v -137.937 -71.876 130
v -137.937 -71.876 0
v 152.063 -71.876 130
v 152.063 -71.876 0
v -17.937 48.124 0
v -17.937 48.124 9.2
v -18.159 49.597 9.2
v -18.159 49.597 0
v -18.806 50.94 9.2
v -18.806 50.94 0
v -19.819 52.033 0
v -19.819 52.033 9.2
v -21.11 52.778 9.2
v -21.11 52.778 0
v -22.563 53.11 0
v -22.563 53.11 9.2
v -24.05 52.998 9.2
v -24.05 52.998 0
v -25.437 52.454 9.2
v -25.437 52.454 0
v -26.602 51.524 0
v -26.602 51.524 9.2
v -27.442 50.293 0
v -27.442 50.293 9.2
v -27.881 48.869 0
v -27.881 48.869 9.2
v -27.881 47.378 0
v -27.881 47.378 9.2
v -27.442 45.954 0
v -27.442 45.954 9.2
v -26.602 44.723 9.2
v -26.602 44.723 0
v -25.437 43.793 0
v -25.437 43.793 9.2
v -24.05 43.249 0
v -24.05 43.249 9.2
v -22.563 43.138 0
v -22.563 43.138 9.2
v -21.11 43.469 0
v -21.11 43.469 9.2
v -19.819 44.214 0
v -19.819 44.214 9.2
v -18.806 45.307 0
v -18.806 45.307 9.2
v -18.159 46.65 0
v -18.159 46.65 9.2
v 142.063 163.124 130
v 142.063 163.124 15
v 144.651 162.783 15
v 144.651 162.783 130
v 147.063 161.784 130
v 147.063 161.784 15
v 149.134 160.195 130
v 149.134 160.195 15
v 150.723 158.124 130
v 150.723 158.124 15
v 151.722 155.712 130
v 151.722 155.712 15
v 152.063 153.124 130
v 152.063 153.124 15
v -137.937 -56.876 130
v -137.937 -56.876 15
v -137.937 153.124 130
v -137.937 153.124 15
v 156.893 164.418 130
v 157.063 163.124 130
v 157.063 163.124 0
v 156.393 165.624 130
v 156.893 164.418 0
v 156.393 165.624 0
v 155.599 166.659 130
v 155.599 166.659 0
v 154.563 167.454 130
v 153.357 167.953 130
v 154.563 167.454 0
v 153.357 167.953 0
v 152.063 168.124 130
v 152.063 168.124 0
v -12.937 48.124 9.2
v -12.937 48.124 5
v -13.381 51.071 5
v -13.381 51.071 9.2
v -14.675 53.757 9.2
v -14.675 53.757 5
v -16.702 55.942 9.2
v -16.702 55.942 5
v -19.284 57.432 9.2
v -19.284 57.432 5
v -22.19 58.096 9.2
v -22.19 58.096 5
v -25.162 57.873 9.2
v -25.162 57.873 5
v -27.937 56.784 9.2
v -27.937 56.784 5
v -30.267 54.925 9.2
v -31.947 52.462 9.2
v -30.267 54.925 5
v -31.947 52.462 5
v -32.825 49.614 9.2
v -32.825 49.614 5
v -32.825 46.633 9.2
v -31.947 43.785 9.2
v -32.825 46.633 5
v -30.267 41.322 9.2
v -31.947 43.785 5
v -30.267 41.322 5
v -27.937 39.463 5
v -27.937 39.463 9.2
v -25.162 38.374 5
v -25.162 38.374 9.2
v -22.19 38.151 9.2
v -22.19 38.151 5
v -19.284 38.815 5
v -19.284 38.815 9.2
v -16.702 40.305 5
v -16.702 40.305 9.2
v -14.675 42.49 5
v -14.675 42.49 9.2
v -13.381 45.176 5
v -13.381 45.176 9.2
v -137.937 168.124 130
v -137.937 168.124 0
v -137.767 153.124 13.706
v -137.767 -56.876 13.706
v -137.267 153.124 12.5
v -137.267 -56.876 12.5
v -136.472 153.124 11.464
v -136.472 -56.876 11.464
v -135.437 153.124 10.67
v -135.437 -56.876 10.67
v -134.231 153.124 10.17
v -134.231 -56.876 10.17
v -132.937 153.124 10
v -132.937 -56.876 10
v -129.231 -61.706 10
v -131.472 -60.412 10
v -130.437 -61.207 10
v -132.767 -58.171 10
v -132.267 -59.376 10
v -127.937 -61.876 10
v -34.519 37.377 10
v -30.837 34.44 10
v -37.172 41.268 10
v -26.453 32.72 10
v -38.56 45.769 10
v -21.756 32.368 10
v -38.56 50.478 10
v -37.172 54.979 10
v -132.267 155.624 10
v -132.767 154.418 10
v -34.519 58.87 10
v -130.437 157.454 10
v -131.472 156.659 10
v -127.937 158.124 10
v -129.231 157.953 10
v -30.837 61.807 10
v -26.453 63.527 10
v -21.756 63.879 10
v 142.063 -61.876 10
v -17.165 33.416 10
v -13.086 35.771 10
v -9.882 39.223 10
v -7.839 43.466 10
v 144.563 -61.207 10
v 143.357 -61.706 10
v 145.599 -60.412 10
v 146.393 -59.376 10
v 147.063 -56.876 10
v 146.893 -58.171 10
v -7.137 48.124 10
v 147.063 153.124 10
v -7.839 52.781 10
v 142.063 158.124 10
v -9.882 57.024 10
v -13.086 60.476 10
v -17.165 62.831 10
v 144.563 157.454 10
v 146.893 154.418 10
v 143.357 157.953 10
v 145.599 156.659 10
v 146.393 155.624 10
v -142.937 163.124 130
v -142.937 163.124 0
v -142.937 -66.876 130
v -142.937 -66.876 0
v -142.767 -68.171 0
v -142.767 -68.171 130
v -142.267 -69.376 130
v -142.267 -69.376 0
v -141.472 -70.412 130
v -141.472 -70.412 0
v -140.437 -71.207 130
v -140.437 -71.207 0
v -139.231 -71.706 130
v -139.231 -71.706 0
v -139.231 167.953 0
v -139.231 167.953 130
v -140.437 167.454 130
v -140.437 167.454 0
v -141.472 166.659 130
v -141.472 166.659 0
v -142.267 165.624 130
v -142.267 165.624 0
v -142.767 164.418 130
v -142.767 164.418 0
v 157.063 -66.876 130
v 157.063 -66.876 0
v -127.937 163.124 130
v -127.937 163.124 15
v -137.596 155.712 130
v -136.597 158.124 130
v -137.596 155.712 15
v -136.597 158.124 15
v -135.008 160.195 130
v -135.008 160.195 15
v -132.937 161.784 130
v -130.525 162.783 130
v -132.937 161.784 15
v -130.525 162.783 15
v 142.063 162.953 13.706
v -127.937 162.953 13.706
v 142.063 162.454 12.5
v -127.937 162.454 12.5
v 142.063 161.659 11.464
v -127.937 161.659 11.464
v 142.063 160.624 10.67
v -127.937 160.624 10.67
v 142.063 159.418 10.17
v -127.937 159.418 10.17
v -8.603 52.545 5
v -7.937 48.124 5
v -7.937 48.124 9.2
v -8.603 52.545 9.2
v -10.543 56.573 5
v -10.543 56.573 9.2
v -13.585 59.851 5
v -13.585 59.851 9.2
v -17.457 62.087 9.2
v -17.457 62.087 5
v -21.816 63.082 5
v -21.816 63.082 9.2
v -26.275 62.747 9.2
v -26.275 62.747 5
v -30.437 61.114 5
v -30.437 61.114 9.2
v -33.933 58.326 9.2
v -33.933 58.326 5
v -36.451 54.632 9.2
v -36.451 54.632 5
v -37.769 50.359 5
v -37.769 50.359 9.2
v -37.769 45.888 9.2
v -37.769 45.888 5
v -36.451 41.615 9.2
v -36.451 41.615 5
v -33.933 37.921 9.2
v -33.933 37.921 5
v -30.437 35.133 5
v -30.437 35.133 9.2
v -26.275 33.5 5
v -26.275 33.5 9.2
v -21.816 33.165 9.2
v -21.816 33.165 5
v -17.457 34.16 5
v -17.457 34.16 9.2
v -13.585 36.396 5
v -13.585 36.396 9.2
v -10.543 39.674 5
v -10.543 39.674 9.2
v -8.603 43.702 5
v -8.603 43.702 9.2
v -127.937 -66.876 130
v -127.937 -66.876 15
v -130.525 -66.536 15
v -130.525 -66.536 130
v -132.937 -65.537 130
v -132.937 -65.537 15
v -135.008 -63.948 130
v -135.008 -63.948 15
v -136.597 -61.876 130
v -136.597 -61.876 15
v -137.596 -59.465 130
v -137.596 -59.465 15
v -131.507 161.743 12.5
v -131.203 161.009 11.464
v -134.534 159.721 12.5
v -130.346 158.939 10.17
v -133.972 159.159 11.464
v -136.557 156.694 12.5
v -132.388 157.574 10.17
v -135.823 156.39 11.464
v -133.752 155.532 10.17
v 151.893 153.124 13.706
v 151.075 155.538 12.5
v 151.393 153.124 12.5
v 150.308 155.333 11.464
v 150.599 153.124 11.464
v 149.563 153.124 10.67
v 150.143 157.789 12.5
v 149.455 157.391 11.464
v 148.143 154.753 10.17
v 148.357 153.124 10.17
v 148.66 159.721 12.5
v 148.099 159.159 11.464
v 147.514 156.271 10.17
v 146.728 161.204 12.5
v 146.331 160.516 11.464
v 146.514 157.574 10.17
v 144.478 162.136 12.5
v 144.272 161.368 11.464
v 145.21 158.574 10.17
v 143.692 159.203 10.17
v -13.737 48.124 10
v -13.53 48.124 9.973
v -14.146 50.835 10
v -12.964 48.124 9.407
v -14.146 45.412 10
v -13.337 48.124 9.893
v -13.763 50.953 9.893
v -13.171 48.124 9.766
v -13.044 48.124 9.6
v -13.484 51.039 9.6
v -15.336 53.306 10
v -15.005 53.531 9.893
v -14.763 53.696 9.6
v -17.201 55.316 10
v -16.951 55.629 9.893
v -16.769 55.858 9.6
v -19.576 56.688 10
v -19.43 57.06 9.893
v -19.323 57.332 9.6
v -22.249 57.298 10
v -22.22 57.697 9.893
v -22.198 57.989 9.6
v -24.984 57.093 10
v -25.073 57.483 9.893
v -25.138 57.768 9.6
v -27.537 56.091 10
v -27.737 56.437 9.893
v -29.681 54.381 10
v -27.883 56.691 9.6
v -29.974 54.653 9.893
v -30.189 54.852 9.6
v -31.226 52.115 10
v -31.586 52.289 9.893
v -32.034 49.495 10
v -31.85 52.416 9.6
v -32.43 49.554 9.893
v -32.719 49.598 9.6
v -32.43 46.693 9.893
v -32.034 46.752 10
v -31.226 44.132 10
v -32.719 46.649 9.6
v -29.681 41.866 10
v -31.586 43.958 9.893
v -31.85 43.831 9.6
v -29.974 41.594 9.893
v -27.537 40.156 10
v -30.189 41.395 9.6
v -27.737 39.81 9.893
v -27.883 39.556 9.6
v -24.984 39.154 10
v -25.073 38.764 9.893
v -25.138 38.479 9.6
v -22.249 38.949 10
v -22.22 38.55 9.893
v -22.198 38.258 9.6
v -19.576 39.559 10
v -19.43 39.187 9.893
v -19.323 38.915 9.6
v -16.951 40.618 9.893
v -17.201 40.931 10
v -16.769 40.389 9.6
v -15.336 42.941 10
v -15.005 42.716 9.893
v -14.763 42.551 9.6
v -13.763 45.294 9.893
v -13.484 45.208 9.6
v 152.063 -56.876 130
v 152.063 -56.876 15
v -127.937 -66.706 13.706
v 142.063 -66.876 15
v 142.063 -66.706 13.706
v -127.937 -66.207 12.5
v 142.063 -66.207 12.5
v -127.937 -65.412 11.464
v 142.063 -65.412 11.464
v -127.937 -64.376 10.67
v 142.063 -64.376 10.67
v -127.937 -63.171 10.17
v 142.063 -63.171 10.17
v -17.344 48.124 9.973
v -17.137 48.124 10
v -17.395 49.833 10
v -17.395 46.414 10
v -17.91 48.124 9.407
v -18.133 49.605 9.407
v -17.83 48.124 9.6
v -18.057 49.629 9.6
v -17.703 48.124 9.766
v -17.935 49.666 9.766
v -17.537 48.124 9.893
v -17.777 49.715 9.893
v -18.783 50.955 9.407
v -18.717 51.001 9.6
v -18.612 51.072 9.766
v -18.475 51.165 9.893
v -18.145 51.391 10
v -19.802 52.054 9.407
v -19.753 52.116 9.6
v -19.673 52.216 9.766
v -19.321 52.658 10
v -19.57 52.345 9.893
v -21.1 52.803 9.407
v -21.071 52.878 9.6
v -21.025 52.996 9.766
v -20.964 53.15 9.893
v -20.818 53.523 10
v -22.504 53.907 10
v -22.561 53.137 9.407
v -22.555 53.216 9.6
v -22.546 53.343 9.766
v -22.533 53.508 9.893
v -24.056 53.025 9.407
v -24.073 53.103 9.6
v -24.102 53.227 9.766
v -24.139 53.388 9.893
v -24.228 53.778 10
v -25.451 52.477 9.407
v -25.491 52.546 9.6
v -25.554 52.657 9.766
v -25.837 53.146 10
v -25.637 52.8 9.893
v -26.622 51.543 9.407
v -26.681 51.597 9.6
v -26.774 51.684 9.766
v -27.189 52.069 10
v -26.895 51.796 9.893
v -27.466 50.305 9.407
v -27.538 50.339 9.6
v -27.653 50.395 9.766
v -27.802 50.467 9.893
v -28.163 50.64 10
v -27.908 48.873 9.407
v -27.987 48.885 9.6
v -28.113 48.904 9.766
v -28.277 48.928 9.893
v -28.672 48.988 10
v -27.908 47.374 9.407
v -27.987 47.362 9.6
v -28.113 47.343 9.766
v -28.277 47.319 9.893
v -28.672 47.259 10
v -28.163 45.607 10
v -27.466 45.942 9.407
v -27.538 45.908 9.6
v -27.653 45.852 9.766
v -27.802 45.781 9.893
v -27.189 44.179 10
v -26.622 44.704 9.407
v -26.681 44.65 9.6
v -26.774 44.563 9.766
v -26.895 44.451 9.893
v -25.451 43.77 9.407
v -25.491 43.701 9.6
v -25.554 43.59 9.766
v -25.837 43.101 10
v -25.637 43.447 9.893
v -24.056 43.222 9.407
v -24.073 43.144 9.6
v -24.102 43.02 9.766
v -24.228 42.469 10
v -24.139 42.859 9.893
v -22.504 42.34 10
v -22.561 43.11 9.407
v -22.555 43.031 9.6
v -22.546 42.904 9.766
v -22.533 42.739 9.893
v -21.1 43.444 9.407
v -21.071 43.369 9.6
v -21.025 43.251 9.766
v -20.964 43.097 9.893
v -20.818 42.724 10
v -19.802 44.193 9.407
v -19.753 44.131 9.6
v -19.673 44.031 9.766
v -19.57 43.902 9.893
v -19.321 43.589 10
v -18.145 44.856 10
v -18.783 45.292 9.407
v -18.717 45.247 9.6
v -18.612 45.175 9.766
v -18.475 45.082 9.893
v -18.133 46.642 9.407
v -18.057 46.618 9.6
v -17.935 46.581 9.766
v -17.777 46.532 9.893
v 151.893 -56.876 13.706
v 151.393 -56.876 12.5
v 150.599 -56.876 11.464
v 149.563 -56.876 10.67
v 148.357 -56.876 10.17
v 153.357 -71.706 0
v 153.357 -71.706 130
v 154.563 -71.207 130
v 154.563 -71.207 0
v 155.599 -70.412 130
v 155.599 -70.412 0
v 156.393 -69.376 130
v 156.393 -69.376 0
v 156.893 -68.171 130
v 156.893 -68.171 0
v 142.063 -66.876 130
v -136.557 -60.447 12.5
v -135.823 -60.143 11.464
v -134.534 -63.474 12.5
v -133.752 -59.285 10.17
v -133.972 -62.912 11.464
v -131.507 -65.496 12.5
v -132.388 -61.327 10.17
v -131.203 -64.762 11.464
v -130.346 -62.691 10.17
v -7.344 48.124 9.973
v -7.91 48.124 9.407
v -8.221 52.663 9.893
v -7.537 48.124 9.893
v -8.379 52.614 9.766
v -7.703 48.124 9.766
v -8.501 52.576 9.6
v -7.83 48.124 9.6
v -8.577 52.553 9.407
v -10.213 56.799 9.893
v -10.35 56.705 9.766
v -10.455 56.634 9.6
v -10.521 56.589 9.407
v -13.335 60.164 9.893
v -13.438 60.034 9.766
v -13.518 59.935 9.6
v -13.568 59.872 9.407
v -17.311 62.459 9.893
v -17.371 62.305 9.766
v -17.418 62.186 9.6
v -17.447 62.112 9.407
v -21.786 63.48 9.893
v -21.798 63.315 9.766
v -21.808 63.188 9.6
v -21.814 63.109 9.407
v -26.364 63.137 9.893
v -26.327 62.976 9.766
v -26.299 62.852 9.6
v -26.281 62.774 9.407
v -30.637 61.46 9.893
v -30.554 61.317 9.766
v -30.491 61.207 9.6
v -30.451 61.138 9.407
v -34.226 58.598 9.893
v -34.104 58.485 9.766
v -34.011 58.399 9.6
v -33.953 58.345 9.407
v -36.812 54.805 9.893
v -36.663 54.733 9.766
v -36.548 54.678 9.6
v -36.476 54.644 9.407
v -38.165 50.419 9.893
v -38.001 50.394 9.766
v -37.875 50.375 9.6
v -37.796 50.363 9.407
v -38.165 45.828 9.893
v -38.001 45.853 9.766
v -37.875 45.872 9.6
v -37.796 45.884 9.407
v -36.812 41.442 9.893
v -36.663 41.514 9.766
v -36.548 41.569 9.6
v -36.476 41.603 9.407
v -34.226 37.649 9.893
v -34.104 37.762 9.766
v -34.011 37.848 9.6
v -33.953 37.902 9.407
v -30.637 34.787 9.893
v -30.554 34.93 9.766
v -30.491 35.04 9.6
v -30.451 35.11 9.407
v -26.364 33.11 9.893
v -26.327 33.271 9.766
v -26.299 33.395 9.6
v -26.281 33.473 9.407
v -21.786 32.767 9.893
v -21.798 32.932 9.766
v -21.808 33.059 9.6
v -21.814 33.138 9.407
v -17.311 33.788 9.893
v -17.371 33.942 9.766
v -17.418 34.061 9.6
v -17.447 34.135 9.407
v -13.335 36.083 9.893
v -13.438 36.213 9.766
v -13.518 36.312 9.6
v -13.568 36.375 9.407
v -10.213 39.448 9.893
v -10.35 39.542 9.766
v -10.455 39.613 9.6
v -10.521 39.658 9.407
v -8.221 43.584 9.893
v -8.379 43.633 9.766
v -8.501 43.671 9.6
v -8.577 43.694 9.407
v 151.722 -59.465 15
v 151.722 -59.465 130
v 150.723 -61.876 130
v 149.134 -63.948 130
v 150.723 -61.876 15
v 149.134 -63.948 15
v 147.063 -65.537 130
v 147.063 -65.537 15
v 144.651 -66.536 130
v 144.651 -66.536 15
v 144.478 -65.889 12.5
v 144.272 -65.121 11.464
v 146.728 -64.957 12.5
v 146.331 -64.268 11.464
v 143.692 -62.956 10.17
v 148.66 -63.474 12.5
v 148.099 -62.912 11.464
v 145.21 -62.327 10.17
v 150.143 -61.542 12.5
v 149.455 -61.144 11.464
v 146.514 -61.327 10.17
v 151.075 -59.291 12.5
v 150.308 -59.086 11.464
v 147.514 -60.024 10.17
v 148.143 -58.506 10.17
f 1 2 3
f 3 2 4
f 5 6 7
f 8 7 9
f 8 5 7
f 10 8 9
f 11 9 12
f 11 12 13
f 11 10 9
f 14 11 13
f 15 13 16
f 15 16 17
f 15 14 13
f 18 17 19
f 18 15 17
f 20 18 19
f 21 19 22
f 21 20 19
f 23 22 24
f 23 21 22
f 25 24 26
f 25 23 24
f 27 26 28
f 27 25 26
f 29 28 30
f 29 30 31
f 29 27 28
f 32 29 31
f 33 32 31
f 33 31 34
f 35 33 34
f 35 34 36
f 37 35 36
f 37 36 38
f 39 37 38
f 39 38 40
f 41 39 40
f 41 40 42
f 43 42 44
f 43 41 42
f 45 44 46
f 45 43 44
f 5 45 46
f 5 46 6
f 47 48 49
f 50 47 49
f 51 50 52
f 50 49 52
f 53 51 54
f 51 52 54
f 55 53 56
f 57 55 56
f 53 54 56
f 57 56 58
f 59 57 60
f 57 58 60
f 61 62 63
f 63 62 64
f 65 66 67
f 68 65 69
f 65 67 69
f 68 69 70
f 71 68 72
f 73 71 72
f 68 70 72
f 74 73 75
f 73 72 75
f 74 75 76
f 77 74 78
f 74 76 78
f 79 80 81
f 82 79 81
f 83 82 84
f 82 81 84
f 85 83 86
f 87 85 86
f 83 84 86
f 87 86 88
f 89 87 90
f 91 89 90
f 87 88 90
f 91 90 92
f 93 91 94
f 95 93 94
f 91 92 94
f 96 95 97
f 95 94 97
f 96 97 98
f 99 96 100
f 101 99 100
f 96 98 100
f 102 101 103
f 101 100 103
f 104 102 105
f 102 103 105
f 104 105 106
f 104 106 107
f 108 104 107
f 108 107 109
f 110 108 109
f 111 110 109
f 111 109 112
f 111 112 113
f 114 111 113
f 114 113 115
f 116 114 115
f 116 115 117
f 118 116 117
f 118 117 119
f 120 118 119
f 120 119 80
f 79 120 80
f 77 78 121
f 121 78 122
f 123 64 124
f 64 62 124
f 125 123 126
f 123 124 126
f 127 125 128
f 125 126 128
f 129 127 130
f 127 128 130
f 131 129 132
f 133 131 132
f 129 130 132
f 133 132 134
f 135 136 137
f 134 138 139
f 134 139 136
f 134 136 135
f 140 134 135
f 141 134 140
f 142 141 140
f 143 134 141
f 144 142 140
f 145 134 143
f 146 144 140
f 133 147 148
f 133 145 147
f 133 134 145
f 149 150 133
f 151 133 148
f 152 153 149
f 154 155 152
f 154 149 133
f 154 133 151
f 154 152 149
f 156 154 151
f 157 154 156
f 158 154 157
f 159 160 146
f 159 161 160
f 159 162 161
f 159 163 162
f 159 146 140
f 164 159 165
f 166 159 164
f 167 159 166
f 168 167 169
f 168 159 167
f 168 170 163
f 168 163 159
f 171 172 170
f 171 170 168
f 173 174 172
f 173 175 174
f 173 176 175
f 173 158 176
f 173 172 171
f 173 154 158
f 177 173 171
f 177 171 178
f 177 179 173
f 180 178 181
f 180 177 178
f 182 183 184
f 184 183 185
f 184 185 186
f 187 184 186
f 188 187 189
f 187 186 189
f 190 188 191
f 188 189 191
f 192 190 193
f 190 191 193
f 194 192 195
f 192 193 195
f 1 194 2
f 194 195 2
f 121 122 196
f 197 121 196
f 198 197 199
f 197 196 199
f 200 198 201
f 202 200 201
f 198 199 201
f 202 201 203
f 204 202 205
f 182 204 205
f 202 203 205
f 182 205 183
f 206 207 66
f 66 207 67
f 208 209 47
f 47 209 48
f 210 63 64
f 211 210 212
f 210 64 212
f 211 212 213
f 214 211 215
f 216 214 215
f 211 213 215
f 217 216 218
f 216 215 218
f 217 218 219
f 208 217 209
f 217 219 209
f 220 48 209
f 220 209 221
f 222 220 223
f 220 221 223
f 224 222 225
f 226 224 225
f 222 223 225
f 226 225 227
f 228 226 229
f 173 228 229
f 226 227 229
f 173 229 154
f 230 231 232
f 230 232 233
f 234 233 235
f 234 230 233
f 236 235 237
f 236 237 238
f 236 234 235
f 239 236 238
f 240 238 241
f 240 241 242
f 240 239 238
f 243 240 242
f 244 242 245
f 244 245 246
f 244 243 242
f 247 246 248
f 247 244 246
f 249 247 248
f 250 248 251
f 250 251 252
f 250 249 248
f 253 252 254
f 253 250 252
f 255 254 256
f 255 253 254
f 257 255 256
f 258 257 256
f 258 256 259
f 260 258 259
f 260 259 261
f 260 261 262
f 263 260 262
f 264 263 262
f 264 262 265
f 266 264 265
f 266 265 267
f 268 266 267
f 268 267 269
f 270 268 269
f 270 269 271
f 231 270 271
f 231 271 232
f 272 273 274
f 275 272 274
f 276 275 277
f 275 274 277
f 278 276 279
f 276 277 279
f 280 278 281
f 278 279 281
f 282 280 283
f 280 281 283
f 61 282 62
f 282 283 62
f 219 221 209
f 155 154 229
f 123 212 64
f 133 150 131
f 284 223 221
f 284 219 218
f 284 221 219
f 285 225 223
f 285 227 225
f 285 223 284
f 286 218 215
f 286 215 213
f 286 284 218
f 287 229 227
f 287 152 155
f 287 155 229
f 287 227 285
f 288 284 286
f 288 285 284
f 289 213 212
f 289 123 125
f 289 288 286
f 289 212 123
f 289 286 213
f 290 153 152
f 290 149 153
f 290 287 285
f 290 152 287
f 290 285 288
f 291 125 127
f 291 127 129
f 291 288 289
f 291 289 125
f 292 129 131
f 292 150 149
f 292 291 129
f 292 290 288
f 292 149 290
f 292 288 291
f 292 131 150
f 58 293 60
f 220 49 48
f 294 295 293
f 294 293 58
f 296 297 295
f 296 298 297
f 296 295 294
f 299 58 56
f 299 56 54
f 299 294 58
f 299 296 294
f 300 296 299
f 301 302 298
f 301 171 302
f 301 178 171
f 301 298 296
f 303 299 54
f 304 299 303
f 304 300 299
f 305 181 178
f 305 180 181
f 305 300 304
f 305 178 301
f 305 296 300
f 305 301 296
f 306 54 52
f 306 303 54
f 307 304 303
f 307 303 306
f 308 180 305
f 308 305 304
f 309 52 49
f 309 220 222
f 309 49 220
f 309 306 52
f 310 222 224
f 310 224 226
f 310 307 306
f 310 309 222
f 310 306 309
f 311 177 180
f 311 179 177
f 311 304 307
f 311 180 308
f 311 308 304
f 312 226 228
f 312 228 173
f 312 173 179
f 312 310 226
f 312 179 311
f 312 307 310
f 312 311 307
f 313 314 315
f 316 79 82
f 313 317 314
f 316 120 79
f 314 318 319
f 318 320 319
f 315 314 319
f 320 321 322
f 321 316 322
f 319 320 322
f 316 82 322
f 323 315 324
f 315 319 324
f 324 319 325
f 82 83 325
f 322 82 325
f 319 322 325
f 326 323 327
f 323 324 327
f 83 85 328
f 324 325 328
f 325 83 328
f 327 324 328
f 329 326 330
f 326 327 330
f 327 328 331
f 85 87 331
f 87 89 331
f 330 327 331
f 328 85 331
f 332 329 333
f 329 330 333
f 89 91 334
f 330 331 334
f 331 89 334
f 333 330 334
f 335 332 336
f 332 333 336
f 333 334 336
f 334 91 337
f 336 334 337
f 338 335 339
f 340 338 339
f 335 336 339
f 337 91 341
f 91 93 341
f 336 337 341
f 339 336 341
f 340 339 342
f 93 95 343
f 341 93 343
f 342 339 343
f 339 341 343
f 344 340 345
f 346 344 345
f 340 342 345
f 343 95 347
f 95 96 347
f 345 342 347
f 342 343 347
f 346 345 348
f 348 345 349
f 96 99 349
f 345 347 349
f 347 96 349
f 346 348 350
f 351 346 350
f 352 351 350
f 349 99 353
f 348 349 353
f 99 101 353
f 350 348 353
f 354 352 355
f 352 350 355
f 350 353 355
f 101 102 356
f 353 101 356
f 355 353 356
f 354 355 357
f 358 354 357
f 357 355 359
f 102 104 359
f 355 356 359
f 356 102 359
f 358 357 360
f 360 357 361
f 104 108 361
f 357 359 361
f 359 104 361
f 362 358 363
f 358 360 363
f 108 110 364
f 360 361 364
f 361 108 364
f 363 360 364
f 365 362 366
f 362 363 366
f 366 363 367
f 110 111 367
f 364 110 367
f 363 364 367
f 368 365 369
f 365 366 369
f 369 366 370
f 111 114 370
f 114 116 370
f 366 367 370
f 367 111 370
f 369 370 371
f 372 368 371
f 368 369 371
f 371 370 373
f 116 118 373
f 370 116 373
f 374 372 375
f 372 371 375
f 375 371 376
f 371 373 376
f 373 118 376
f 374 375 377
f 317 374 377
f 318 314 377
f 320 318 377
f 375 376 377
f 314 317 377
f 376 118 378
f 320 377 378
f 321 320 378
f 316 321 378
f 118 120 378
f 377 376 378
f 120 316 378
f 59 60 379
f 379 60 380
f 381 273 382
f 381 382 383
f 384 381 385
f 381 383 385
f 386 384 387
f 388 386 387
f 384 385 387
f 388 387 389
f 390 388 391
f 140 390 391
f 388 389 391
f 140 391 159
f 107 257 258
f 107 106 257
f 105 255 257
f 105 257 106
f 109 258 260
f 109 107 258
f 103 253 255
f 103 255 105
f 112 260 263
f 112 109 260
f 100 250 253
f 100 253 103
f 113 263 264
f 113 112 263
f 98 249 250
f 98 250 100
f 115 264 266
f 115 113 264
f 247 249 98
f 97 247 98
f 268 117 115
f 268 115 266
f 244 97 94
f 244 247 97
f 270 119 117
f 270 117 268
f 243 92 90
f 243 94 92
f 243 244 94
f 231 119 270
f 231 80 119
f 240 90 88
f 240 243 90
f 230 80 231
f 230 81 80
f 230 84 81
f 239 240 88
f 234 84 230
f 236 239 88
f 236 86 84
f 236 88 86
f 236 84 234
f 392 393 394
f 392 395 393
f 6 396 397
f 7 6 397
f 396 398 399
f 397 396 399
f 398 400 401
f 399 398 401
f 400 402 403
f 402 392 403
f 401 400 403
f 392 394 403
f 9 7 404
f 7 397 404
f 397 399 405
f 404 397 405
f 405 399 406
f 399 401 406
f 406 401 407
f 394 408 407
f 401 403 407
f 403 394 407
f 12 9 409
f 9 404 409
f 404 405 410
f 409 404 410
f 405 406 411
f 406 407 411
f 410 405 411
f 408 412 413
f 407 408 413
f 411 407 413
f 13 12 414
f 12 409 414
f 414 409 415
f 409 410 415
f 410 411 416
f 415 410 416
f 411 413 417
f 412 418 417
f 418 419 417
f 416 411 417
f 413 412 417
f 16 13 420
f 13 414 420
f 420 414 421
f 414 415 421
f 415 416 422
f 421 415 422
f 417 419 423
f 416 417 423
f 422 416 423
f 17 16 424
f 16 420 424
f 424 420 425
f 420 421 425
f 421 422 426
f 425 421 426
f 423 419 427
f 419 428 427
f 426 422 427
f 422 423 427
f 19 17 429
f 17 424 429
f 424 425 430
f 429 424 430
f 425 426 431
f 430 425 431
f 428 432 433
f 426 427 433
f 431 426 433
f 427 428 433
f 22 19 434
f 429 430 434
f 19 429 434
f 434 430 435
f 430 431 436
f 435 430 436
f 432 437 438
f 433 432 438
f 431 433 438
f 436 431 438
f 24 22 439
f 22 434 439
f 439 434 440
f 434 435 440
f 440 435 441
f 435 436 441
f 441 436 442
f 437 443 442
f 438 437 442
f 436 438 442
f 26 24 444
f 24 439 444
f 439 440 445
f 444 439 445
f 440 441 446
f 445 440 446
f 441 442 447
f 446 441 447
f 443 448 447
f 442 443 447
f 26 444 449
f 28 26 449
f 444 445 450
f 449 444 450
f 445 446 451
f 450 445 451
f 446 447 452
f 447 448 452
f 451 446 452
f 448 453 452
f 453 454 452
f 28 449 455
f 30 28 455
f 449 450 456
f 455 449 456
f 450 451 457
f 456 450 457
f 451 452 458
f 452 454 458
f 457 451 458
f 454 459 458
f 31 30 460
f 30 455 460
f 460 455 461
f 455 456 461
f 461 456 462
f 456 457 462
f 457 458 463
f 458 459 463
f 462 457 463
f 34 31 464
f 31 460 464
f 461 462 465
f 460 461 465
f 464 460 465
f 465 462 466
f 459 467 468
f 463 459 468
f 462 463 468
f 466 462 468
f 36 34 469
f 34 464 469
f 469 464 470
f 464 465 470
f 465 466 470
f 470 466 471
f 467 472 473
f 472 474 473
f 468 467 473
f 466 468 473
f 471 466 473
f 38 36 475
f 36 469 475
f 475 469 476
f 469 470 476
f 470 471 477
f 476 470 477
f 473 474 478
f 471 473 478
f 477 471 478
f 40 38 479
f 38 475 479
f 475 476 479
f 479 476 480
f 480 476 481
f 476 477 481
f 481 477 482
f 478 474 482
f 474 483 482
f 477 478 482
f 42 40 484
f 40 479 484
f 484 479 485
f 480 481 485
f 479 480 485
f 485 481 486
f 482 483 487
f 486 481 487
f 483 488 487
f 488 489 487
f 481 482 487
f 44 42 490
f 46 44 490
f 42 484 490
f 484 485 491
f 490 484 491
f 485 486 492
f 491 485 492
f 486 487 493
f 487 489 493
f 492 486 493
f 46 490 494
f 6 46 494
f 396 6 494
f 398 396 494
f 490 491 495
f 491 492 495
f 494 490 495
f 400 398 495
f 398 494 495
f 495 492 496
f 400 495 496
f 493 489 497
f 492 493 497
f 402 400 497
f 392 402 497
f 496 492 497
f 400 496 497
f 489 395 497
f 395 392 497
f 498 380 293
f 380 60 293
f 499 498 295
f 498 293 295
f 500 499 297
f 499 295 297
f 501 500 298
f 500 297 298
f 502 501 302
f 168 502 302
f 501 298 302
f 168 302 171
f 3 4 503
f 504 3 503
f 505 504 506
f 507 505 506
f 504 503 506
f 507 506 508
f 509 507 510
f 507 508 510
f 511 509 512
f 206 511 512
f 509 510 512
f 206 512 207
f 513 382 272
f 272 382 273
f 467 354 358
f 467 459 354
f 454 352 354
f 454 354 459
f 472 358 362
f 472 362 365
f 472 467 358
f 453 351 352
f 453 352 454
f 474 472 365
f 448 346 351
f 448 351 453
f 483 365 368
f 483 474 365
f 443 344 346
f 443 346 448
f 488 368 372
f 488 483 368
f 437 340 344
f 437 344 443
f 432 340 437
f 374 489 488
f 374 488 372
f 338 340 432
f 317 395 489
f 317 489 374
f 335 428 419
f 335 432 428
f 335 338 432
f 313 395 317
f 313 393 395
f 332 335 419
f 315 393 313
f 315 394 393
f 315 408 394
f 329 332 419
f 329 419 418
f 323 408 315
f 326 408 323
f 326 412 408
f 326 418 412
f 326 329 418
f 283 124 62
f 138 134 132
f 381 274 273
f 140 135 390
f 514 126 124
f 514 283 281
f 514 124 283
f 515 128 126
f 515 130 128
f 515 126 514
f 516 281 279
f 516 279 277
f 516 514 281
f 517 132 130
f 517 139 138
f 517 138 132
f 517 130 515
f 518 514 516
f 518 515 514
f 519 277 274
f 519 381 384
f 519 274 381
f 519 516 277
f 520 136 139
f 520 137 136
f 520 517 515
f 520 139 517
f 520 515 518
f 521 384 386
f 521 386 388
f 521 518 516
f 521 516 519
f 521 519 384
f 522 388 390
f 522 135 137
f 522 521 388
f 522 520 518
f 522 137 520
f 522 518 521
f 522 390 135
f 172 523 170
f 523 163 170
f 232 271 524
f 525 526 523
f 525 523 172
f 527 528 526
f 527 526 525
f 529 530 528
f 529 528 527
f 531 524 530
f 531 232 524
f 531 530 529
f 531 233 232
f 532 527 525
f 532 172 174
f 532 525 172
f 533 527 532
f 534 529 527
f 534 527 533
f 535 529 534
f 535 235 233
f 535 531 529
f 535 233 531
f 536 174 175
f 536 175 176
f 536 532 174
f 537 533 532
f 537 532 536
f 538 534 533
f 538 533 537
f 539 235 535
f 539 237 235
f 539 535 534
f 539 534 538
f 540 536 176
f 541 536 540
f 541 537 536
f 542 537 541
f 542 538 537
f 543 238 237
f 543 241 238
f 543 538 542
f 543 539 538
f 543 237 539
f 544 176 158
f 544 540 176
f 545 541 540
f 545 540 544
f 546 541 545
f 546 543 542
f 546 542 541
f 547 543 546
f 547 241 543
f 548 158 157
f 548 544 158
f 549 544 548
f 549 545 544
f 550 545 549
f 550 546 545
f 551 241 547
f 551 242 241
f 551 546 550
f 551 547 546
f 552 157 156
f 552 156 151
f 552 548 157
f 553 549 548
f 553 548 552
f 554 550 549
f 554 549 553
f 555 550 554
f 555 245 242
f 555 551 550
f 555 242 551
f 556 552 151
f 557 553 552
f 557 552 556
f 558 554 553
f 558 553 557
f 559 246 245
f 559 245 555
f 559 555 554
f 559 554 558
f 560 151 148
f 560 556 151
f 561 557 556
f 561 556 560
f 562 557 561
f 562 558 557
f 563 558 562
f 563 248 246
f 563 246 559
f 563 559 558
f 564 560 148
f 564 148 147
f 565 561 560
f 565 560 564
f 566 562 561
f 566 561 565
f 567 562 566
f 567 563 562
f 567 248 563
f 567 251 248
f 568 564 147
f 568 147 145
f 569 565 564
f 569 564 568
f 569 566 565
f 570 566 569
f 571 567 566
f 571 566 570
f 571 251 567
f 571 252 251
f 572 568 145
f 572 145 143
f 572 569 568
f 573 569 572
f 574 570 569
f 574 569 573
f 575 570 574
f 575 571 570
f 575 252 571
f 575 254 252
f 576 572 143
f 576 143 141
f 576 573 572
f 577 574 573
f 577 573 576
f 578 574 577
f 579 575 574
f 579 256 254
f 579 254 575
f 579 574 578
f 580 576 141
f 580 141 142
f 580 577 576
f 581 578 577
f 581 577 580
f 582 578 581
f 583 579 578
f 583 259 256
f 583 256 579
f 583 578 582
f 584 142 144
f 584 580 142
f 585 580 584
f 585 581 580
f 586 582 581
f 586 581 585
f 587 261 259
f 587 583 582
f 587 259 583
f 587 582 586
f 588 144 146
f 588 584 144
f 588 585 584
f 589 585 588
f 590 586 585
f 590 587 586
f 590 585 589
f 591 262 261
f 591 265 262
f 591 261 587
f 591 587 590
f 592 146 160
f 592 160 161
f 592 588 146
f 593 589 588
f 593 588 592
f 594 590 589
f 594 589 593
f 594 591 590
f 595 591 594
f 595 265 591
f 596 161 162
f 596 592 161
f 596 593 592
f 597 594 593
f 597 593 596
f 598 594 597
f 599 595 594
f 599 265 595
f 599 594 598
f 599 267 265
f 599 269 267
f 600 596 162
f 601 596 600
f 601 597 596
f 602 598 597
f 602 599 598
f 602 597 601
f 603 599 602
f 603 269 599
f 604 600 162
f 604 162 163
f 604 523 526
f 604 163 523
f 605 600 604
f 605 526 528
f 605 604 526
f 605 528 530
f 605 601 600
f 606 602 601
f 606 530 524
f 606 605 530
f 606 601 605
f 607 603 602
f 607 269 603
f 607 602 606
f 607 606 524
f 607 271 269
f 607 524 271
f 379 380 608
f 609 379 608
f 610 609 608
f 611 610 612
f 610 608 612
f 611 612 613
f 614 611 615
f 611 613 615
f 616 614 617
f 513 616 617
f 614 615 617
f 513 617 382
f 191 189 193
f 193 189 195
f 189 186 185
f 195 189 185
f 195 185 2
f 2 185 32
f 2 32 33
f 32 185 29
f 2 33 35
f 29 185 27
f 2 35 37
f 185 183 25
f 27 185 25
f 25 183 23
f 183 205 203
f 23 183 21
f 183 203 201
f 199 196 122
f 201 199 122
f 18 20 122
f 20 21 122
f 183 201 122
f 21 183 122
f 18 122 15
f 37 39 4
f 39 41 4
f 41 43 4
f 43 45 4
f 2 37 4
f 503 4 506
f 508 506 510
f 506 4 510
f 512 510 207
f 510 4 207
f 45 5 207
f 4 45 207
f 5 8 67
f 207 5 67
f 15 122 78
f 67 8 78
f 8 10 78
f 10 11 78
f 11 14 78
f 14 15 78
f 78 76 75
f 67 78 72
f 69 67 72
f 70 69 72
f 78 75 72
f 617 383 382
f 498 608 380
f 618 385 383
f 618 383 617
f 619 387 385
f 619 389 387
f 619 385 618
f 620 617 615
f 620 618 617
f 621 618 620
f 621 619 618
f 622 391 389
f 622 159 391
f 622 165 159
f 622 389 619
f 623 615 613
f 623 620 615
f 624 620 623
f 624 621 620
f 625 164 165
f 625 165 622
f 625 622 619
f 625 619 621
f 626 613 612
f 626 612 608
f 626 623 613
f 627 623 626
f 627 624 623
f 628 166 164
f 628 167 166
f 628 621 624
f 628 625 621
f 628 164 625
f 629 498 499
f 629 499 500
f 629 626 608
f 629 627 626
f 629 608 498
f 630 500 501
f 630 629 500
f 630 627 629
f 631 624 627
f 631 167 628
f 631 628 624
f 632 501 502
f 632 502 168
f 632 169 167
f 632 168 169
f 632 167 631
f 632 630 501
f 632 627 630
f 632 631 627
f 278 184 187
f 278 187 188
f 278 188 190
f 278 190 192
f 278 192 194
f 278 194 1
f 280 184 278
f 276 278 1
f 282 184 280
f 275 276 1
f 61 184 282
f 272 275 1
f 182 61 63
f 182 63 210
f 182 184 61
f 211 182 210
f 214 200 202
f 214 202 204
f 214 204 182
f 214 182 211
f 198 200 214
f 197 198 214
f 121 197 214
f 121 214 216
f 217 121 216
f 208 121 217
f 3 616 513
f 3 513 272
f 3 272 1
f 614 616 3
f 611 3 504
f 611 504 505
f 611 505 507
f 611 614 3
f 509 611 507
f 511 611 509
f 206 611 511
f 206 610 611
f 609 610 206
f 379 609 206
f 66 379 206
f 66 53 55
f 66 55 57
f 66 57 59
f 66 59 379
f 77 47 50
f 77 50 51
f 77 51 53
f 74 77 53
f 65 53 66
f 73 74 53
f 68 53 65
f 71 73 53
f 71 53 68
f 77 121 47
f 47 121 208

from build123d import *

# Parameters (mm, degrees)
F1_DEPTH = 130
F0_R     = 15
F2_DEPTH = 10
F0_R_2   = 10
F0_R_3   = 5
F3_DEPTH = 5
F4_R     = 0.8
F5_R     = 5


with BuildPart() as f1:
    # F0 (on Top) → F1 (new body)
    with BuildSketch(Plane.XY):
        with BuildLine():
            ThreePointArc((-137.9369372874, 168.1235290214), (-141.4724711934, 166.6590629273), (-142.9369372874, 163.1235290214))
            Line((-142.9369372874, 163.1235290214), (-142.9369372874, -66.8764709786))
            ThreePointArc((-142.9369372874, -66.8764709786), (-141.4724711934, -70.4120048845), (-137.9369372874, -71.8764709786))
            Line((-137.9369372874, -71.8764709786), (152.0630627126, -71.8764709786))
            ThreePointArc((152.0630627126, -71.8764709786), (155.5985966185, -70.4120048845), (157.0630627126, -66.8764709786))
            Line((157.0630627126, -66.8764709786), (157.0630627126, 163.1235290214))
            ThreePointArc((157.0630627126, 163.1235290214), (155.5985966185, 166.6590629273), (152.0630627126, 168.1235290214))
            Line((152.0630627126, 168.1235290214), (-137.9369372874, 168.1235290214))
        make_face()
        with BuildLine():
            ThreePointArc((-137.9369372874, 153.1235290214), (-135.0080050993, 160.1945968333), (-127.9369372874, 163.1235290214))
            Line((-127.9369372874, 163.1235290214), (92.0630627126, 163.1235290214))
            Line((92.0630627126, 163.1235290214), (142.0630627126, 163.1235290214))
            ThreePointArc((142.0630627126, 163.1235290214), (149.1341305244, 160.1945968333), (152.0630627126, 153.1235290214))
            Line((152.0630627126, 153.1235290214), (152.0630627126, -56.8764709786))
            ThreePointArc((152.0630627126, -56.8764709786), (149.1341305244, -63.9475387905), (142.0630627126, -66.8764709786))
            Line((142.0630627126, -66.8764709786), (92.0630627126, -66.8764709786))
            Line((92.0630627126, -66.8764709786), (-127.9369372874, -66.8764709786))
            ThreePointArc((-127.9369372874, -66.8764709786), (-135.0080050993, -63.9475387905), (-137.9369372874, -56.8764709786))
            Line((-137.9369372874, -56.8764709786), (-137.9369372874, 153.1235290214))
        make_face(mode=Mode.SUBTRACT)
    extrude(amount=F1_DEPTH)

    # F0 (on Top) → F2 (join)
    with BuildSketch(Plane.XY):
        with BuildLine():
            Line((92.0630627126, 163.1235290214), (-127.9369372874, 163.1235290214))
            ThreePointArc((-127.9369372874, 163.1235290214), (-135.0080050993, 160.1945968333), (-137.9369372874, 153.1235290214))
            Line((-137.9369372874, 153.1235290214), (-137.9369372874, -56.8764709786))
            ThreePointArc((-137.9369372874, -56.8764709786), (-135.0080050993, -63.9475387905), (-127.9369372874, -66.8764709786))
            Line((-127.9369372874, -66.8764709786), (92.0630627126, -66.8764709786))
            Line((92.0630627126, -66.8764709786), (92.0630627126, 163.1235290214))
        make_face()
        with Locations((-22.9369372874, 48.1235290214)):
            Circle(F0_R, mode=Mode.SUBTRACT)
        with BuildLine():
            Line((142.0630627126, 163.1235290214), (92.0630627126, 163.1235290214))
            Line((92.0630627126, 163.1235290214), (92.0630627126, -66.8764709786))
            Line((92.0630627126, -66.8764709786), (142.0630627126, -66.8764709786))
            ThreePointArc((142.0630627126, -66.8764709786), (149.1341305244, -63.9475387905), (152.0630627126, -56.8764709786))
            Line((152.0630627126, -56.8764709786), (152.0630627126, 153.1235290214))
            ThreePointArc((152.0630627126, 153.1235290214), (149.1341305244, 160.1945968333), (142.0630627126, 163.1235290214))
        make_face()
    extrude(amount=F2_DEPTH)



with BuildPart() as f2:
    # F0 (on Top) → F2, piece 2 (new body)
    with BuildSketch(Plane.XY):
        with Locations((-22.9369372874, 48.1235290214)):
            Circle(F0_R_2)
        with Locations((-22.9369372874, 48.1235290214)):
            Circle(F0_R_3, mode=Mode.SUBTRACT)
    extrude(amount=F2_DEPTH)


with BuildPart() as f1_1:
    add(f1.part)

    add(f2.part)  # F3 merges F2
    # F0 (on Top) → F3 (join)
    with BuildSketch(Plane.XY):
        with Locations((-22.9369372874, 48.1235290214)):
            Circle(F0_R)
        with Locations((-22.9369372874, 48.1235290214)):
            Circle(F0_R_2, mode=Mode.SUBTRACT)
    extrude(amount=F3_DEPTH)

    # F4
    f4_edges = [f1_1.edges().sort_by_distance(p)[0] for p in [
        (-32.936937, 48.123529, 10),
        (-27.936937, 48.123529, 10),
        (-37.936937, 48.123529, 10),
    ]]
    fillet(f4_edges, radius=F4_R)

    # F5
    f5_edges = [f1_1.edges().sort_by_distance(p)[0] for p in [
        (-38.736937, 48.123529, 10),
        (-135.008005, 160.194597, 10),
        (-137.936937, 48.123529, 10),
        (-135.008005, -63.947539, 10),
        (7.063063, -66.876471, 10),
        (149.134131, -63.947539, 10),
        (152.063063, 48.123529, 10),
        (149.134131, 160.194597, 10),
        (7.063063, 163.123529, 10),
    ]]
    fillet(f5_edges, radius=F5_R)


solid = f1_1.part
